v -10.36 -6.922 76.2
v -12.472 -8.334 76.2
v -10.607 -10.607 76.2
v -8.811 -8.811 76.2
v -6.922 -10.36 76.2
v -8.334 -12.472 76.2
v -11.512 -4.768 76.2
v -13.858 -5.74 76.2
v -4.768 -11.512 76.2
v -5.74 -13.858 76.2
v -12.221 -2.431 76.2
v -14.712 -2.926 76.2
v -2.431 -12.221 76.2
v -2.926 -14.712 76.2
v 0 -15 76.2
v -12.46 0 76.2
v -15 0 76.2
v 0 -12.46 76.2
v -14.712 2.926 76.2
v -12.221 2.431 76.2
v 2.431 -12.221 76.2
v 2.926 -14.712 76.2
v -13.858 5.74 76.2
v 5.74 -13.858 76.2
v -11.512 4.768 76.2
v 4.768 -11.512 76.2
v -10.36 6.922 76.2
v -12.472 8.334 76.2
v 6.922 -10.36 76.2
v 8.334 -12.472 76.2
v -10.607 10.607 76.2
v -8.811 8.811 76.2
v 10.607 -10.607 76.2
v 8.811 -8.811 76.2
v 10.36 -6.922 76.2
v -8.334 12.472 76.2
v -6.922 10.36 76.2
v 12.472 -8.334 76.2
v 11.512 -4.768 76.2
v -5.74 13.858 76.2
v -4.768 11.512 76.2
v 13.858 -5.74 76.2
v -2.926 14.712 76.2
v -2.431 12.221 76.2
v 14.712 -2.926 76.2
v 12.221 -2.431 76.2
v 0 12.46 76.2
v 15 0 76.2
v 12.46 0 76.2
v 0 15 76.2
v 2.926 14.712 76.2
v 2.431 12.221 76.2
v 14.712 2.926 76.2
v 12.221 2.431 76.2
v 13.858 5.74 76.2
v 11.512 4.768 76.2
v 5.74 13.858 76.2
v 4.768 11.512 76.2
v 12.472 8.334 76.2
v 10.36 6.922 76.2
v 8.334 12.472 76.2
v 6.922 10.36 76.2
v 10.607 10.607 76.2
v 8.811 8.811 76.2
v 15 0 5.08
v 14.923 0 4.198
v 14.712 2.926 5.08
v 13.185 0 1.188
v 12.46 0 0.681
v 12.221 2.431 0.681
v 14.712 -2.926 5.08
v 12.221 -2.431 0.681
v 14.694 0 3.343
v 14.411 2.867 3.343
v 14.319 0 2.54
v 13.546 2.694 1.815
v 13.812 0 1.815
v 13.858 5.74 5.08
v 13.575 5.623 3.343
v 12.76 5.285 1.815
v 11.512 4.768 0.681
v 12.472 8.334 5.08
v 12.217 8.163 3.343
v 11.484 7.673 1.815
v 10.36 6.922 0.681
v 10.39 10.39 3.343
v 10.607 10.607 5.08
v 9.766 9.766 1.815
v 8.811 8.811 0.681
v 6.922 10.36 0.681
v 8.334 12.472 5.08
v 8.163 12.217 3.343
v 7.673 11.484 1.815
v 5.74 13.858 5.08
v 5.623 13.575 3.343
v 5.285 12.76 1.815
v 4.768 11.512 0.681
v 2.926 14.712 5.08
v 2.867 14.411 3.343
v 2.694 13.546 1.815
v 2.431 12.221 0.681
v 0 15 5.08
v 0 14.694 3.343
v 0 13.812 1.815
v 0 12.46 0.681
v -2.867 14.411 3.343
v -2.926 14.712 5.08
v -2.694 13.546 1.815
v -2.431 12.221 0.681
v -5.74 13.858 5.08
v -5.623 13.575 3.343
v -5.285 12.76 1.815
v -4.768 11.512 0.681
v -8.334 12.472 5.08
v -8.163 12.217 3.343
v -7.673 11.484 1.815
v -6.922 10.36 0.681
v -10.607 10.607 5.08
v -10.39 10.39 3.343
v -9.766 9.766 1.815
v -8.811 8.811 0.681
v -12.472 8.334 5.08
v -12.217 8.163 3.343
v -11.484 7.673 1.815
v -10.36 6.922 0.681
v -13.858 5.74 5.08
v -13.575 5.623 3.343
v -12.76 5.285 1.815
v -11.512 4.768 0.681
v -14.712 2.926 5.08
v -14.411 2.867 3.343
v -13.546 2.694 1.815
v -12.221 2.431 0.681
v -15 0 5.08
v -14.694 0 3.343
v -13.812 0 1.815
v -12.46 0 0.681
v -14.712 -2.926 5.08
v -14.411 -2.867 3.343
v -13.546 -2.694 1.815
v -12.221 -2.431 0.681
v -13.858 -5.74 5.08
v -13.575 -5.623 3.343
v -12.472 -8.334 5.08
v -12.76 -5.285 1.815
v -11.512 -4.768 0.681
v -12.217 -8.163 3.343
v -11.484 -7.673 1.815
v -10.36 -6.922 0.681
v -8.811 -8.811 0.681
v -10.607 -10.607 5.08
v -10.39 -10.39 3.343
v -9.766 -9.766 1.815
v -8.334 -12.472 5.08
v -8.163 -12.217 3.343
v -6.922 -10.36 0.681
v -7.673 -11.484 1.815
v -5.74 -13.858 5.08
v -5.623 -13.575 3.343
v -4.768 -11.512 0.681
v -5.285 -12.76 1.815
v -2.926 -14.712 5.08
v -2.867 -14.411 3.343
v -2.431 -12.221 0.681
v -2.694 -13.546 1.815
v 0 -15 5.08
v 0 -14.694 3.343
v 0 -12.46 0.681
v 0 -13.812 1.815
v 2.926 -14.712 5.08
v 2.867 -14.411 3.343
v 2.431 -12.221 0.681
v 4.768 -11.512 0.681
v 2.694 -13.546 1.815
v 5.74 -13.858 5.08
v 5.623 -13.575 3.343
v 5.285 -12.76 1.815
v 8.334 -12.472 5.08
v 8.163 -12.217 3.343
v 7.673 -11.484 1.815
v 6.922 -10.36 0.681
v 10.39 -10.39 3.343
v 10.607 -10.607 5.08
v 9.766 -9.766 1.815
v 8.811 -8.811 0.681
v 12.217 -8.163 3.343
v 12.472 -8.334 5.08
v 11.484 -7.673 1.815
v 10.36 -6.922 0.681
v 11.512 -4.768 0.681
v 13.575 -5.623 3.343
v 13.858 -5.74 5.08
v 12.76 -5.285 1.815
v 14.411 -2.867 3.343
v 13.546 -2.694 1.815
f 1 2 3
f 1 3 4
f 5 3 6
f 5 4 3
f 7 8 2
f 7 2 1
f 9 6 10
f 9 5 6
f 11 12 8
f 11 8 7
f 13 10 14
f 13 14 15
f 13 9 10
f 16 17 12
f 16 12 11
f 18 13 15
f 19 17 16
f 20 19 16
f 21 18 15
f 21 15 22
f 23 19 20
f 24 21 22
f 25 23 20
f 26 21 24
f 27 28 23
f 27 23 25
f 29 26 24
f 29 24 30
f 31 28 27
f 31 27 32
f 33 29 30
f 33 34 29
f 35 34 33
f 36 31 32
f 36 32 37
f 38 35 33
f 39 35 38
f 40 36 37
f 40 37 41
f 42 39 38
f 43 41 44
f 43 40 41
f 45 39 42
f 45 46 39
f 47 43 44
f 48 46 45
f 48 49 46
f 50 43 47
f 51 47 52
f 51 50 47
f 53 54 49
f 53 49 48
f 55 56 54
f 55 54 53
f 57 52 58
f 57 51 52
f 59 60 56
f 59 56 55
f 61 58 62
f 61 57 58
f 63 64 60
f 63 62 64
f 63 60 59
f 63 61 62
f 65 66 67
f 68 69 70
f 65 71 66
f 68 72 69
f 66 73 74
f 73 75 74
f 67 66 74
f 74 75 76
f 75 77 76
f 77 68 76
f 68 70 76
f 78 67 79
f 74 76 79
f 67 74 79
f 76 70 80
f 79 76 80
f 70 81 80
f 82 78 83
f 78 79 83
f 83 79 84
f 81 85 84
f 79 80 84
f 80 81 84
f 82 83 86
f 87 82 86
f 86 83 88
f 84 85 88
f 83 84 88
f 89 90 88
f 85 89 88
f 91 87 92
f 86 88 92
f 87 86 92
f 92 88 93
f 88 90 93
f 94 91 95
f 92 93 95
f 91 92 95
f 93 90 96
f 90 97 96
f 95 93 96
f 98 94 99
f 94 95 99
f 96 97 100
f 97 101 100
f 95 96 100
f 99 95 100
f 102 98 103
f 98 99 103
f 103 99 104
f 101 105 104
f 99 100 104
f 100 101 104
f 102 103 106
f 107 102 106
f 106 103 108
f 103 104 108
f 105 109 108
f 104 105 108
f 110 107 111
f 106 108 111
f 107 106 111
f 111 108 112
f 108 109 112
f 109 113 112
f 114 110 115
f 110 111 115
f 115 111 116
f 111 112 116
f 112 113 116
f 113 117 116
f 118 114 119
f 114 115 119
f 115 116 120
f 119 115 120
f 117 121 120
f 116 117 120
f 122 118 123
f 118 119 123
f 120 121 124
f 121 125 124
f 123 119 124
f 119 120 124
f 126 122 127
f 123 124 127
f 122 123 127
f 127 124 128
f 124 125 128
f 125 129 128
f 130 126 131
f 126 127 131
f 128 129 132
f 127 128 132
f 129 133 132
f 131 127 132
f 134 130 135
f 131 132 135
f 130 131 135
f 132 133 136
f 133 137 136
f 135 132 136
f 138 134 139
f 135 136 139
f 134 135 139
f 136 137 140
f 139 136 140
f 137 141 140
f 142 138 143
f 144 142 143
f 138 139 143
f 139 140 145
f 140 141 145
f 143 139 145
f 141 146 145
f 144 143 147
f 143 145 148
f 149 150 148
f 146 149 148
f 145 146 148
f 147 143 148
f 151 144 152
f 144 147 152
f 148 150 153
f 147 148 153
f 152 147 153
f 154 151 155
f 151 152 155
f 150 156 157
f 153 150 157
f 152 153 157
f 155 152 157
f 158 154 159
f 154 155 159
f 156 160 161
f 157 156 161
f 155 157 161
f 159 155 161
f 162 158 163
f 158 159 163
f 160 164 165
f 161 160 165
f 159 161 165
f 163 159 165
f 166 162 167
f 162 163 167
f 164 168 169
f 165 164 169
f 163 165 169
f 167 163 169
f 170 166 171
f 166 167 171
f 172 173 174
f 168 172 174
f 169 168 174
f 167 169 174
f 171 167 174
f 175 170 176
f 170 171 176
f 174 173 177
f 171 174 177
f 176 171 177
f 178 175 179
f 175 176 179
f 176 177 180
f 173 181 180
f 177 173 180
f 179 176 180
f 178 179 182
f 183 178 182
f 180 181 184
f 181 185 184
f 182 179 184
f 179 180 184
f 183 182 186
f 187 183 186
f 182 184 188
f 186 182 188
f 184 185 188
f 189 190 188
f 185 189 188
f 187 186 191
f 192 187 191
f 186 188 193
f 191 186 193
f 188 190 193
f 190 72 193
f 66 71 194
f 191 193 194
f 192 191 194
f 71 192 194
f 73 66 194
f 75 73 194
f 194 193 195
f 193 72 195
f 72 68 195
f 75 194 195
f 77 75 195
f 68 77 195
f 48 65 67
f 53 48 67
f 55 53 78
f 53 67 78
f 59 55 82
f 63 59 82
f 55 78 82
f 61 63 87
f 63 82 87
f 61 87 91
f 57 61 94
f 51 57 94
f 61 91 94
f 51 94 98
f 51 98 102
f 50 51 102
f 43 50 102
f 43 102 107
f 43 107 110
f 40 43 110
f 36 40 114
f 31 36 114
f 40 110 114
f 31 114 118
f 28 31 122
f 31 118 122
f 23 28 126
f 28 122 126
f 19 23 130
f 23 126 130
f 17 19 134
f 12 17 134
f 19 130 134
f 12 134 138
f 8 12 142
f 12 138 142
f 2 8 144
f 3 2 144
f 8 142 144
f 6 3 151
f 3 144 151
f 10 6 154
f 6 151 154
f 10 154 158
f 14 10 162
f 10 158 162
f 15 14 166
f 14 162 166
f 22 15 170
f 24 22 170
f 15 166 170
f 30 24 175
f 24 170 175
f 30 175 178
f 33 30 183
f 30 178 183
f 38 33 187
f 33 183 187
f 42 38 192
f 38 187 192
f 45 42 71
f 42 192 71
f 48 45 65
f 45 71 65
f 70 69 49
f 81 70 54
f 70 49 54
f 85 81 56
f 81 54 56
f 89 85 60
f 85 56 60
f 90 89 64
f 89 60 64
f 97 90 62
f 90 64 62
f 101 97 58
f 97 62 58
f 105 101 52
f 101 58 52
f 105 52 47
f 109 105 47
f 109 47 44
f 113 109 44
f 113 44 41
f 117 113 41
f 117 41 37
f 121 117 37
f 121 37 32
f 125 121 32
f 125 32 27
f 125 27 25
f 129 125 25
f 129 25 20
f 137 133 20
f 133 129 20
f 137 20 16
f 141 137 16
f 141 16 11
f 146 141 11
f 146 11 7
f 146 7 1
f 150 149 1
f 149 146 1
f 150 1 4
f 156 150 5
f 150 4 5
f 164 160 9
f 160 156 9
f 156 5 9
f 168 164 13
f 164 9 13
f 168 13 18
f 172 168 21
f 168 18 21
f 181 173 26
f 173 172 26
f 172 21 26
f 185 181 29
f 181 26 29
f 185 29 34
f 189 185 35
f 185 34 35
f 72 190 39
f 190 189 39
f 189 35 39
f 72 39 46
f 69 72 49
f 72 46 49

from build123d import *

# Parameters (mm, degrees)
F0_R     = 15
F1_DEPTH = 76.2
F2_R     = 5.08
F3_R     = 12.46
F4_DEPTH = 76.201


with BuildPart() as f1:
    # F0 (on Top) → F1 (new body)
    with BuildSketch(Plane.XY):
        Circle(F0_R)
    extrude(amount=F1_DEPTH)

    # F2
    f2_edges = [f1.edges().sort_by_distance(p)[0] for p in [
        (-15, 0, 0),
    ]]
    fillet(f2_edges, radius=F2_R)

    # F3 (on face) → F4 (cut, through all)
    with BuildSketch(Plane.XY.offset(76.2)):
        Circle(F3_R)
    extrude(amount=-F4_DEPTH, mode=Mode.SUBTRACT)


solid = f1.part
